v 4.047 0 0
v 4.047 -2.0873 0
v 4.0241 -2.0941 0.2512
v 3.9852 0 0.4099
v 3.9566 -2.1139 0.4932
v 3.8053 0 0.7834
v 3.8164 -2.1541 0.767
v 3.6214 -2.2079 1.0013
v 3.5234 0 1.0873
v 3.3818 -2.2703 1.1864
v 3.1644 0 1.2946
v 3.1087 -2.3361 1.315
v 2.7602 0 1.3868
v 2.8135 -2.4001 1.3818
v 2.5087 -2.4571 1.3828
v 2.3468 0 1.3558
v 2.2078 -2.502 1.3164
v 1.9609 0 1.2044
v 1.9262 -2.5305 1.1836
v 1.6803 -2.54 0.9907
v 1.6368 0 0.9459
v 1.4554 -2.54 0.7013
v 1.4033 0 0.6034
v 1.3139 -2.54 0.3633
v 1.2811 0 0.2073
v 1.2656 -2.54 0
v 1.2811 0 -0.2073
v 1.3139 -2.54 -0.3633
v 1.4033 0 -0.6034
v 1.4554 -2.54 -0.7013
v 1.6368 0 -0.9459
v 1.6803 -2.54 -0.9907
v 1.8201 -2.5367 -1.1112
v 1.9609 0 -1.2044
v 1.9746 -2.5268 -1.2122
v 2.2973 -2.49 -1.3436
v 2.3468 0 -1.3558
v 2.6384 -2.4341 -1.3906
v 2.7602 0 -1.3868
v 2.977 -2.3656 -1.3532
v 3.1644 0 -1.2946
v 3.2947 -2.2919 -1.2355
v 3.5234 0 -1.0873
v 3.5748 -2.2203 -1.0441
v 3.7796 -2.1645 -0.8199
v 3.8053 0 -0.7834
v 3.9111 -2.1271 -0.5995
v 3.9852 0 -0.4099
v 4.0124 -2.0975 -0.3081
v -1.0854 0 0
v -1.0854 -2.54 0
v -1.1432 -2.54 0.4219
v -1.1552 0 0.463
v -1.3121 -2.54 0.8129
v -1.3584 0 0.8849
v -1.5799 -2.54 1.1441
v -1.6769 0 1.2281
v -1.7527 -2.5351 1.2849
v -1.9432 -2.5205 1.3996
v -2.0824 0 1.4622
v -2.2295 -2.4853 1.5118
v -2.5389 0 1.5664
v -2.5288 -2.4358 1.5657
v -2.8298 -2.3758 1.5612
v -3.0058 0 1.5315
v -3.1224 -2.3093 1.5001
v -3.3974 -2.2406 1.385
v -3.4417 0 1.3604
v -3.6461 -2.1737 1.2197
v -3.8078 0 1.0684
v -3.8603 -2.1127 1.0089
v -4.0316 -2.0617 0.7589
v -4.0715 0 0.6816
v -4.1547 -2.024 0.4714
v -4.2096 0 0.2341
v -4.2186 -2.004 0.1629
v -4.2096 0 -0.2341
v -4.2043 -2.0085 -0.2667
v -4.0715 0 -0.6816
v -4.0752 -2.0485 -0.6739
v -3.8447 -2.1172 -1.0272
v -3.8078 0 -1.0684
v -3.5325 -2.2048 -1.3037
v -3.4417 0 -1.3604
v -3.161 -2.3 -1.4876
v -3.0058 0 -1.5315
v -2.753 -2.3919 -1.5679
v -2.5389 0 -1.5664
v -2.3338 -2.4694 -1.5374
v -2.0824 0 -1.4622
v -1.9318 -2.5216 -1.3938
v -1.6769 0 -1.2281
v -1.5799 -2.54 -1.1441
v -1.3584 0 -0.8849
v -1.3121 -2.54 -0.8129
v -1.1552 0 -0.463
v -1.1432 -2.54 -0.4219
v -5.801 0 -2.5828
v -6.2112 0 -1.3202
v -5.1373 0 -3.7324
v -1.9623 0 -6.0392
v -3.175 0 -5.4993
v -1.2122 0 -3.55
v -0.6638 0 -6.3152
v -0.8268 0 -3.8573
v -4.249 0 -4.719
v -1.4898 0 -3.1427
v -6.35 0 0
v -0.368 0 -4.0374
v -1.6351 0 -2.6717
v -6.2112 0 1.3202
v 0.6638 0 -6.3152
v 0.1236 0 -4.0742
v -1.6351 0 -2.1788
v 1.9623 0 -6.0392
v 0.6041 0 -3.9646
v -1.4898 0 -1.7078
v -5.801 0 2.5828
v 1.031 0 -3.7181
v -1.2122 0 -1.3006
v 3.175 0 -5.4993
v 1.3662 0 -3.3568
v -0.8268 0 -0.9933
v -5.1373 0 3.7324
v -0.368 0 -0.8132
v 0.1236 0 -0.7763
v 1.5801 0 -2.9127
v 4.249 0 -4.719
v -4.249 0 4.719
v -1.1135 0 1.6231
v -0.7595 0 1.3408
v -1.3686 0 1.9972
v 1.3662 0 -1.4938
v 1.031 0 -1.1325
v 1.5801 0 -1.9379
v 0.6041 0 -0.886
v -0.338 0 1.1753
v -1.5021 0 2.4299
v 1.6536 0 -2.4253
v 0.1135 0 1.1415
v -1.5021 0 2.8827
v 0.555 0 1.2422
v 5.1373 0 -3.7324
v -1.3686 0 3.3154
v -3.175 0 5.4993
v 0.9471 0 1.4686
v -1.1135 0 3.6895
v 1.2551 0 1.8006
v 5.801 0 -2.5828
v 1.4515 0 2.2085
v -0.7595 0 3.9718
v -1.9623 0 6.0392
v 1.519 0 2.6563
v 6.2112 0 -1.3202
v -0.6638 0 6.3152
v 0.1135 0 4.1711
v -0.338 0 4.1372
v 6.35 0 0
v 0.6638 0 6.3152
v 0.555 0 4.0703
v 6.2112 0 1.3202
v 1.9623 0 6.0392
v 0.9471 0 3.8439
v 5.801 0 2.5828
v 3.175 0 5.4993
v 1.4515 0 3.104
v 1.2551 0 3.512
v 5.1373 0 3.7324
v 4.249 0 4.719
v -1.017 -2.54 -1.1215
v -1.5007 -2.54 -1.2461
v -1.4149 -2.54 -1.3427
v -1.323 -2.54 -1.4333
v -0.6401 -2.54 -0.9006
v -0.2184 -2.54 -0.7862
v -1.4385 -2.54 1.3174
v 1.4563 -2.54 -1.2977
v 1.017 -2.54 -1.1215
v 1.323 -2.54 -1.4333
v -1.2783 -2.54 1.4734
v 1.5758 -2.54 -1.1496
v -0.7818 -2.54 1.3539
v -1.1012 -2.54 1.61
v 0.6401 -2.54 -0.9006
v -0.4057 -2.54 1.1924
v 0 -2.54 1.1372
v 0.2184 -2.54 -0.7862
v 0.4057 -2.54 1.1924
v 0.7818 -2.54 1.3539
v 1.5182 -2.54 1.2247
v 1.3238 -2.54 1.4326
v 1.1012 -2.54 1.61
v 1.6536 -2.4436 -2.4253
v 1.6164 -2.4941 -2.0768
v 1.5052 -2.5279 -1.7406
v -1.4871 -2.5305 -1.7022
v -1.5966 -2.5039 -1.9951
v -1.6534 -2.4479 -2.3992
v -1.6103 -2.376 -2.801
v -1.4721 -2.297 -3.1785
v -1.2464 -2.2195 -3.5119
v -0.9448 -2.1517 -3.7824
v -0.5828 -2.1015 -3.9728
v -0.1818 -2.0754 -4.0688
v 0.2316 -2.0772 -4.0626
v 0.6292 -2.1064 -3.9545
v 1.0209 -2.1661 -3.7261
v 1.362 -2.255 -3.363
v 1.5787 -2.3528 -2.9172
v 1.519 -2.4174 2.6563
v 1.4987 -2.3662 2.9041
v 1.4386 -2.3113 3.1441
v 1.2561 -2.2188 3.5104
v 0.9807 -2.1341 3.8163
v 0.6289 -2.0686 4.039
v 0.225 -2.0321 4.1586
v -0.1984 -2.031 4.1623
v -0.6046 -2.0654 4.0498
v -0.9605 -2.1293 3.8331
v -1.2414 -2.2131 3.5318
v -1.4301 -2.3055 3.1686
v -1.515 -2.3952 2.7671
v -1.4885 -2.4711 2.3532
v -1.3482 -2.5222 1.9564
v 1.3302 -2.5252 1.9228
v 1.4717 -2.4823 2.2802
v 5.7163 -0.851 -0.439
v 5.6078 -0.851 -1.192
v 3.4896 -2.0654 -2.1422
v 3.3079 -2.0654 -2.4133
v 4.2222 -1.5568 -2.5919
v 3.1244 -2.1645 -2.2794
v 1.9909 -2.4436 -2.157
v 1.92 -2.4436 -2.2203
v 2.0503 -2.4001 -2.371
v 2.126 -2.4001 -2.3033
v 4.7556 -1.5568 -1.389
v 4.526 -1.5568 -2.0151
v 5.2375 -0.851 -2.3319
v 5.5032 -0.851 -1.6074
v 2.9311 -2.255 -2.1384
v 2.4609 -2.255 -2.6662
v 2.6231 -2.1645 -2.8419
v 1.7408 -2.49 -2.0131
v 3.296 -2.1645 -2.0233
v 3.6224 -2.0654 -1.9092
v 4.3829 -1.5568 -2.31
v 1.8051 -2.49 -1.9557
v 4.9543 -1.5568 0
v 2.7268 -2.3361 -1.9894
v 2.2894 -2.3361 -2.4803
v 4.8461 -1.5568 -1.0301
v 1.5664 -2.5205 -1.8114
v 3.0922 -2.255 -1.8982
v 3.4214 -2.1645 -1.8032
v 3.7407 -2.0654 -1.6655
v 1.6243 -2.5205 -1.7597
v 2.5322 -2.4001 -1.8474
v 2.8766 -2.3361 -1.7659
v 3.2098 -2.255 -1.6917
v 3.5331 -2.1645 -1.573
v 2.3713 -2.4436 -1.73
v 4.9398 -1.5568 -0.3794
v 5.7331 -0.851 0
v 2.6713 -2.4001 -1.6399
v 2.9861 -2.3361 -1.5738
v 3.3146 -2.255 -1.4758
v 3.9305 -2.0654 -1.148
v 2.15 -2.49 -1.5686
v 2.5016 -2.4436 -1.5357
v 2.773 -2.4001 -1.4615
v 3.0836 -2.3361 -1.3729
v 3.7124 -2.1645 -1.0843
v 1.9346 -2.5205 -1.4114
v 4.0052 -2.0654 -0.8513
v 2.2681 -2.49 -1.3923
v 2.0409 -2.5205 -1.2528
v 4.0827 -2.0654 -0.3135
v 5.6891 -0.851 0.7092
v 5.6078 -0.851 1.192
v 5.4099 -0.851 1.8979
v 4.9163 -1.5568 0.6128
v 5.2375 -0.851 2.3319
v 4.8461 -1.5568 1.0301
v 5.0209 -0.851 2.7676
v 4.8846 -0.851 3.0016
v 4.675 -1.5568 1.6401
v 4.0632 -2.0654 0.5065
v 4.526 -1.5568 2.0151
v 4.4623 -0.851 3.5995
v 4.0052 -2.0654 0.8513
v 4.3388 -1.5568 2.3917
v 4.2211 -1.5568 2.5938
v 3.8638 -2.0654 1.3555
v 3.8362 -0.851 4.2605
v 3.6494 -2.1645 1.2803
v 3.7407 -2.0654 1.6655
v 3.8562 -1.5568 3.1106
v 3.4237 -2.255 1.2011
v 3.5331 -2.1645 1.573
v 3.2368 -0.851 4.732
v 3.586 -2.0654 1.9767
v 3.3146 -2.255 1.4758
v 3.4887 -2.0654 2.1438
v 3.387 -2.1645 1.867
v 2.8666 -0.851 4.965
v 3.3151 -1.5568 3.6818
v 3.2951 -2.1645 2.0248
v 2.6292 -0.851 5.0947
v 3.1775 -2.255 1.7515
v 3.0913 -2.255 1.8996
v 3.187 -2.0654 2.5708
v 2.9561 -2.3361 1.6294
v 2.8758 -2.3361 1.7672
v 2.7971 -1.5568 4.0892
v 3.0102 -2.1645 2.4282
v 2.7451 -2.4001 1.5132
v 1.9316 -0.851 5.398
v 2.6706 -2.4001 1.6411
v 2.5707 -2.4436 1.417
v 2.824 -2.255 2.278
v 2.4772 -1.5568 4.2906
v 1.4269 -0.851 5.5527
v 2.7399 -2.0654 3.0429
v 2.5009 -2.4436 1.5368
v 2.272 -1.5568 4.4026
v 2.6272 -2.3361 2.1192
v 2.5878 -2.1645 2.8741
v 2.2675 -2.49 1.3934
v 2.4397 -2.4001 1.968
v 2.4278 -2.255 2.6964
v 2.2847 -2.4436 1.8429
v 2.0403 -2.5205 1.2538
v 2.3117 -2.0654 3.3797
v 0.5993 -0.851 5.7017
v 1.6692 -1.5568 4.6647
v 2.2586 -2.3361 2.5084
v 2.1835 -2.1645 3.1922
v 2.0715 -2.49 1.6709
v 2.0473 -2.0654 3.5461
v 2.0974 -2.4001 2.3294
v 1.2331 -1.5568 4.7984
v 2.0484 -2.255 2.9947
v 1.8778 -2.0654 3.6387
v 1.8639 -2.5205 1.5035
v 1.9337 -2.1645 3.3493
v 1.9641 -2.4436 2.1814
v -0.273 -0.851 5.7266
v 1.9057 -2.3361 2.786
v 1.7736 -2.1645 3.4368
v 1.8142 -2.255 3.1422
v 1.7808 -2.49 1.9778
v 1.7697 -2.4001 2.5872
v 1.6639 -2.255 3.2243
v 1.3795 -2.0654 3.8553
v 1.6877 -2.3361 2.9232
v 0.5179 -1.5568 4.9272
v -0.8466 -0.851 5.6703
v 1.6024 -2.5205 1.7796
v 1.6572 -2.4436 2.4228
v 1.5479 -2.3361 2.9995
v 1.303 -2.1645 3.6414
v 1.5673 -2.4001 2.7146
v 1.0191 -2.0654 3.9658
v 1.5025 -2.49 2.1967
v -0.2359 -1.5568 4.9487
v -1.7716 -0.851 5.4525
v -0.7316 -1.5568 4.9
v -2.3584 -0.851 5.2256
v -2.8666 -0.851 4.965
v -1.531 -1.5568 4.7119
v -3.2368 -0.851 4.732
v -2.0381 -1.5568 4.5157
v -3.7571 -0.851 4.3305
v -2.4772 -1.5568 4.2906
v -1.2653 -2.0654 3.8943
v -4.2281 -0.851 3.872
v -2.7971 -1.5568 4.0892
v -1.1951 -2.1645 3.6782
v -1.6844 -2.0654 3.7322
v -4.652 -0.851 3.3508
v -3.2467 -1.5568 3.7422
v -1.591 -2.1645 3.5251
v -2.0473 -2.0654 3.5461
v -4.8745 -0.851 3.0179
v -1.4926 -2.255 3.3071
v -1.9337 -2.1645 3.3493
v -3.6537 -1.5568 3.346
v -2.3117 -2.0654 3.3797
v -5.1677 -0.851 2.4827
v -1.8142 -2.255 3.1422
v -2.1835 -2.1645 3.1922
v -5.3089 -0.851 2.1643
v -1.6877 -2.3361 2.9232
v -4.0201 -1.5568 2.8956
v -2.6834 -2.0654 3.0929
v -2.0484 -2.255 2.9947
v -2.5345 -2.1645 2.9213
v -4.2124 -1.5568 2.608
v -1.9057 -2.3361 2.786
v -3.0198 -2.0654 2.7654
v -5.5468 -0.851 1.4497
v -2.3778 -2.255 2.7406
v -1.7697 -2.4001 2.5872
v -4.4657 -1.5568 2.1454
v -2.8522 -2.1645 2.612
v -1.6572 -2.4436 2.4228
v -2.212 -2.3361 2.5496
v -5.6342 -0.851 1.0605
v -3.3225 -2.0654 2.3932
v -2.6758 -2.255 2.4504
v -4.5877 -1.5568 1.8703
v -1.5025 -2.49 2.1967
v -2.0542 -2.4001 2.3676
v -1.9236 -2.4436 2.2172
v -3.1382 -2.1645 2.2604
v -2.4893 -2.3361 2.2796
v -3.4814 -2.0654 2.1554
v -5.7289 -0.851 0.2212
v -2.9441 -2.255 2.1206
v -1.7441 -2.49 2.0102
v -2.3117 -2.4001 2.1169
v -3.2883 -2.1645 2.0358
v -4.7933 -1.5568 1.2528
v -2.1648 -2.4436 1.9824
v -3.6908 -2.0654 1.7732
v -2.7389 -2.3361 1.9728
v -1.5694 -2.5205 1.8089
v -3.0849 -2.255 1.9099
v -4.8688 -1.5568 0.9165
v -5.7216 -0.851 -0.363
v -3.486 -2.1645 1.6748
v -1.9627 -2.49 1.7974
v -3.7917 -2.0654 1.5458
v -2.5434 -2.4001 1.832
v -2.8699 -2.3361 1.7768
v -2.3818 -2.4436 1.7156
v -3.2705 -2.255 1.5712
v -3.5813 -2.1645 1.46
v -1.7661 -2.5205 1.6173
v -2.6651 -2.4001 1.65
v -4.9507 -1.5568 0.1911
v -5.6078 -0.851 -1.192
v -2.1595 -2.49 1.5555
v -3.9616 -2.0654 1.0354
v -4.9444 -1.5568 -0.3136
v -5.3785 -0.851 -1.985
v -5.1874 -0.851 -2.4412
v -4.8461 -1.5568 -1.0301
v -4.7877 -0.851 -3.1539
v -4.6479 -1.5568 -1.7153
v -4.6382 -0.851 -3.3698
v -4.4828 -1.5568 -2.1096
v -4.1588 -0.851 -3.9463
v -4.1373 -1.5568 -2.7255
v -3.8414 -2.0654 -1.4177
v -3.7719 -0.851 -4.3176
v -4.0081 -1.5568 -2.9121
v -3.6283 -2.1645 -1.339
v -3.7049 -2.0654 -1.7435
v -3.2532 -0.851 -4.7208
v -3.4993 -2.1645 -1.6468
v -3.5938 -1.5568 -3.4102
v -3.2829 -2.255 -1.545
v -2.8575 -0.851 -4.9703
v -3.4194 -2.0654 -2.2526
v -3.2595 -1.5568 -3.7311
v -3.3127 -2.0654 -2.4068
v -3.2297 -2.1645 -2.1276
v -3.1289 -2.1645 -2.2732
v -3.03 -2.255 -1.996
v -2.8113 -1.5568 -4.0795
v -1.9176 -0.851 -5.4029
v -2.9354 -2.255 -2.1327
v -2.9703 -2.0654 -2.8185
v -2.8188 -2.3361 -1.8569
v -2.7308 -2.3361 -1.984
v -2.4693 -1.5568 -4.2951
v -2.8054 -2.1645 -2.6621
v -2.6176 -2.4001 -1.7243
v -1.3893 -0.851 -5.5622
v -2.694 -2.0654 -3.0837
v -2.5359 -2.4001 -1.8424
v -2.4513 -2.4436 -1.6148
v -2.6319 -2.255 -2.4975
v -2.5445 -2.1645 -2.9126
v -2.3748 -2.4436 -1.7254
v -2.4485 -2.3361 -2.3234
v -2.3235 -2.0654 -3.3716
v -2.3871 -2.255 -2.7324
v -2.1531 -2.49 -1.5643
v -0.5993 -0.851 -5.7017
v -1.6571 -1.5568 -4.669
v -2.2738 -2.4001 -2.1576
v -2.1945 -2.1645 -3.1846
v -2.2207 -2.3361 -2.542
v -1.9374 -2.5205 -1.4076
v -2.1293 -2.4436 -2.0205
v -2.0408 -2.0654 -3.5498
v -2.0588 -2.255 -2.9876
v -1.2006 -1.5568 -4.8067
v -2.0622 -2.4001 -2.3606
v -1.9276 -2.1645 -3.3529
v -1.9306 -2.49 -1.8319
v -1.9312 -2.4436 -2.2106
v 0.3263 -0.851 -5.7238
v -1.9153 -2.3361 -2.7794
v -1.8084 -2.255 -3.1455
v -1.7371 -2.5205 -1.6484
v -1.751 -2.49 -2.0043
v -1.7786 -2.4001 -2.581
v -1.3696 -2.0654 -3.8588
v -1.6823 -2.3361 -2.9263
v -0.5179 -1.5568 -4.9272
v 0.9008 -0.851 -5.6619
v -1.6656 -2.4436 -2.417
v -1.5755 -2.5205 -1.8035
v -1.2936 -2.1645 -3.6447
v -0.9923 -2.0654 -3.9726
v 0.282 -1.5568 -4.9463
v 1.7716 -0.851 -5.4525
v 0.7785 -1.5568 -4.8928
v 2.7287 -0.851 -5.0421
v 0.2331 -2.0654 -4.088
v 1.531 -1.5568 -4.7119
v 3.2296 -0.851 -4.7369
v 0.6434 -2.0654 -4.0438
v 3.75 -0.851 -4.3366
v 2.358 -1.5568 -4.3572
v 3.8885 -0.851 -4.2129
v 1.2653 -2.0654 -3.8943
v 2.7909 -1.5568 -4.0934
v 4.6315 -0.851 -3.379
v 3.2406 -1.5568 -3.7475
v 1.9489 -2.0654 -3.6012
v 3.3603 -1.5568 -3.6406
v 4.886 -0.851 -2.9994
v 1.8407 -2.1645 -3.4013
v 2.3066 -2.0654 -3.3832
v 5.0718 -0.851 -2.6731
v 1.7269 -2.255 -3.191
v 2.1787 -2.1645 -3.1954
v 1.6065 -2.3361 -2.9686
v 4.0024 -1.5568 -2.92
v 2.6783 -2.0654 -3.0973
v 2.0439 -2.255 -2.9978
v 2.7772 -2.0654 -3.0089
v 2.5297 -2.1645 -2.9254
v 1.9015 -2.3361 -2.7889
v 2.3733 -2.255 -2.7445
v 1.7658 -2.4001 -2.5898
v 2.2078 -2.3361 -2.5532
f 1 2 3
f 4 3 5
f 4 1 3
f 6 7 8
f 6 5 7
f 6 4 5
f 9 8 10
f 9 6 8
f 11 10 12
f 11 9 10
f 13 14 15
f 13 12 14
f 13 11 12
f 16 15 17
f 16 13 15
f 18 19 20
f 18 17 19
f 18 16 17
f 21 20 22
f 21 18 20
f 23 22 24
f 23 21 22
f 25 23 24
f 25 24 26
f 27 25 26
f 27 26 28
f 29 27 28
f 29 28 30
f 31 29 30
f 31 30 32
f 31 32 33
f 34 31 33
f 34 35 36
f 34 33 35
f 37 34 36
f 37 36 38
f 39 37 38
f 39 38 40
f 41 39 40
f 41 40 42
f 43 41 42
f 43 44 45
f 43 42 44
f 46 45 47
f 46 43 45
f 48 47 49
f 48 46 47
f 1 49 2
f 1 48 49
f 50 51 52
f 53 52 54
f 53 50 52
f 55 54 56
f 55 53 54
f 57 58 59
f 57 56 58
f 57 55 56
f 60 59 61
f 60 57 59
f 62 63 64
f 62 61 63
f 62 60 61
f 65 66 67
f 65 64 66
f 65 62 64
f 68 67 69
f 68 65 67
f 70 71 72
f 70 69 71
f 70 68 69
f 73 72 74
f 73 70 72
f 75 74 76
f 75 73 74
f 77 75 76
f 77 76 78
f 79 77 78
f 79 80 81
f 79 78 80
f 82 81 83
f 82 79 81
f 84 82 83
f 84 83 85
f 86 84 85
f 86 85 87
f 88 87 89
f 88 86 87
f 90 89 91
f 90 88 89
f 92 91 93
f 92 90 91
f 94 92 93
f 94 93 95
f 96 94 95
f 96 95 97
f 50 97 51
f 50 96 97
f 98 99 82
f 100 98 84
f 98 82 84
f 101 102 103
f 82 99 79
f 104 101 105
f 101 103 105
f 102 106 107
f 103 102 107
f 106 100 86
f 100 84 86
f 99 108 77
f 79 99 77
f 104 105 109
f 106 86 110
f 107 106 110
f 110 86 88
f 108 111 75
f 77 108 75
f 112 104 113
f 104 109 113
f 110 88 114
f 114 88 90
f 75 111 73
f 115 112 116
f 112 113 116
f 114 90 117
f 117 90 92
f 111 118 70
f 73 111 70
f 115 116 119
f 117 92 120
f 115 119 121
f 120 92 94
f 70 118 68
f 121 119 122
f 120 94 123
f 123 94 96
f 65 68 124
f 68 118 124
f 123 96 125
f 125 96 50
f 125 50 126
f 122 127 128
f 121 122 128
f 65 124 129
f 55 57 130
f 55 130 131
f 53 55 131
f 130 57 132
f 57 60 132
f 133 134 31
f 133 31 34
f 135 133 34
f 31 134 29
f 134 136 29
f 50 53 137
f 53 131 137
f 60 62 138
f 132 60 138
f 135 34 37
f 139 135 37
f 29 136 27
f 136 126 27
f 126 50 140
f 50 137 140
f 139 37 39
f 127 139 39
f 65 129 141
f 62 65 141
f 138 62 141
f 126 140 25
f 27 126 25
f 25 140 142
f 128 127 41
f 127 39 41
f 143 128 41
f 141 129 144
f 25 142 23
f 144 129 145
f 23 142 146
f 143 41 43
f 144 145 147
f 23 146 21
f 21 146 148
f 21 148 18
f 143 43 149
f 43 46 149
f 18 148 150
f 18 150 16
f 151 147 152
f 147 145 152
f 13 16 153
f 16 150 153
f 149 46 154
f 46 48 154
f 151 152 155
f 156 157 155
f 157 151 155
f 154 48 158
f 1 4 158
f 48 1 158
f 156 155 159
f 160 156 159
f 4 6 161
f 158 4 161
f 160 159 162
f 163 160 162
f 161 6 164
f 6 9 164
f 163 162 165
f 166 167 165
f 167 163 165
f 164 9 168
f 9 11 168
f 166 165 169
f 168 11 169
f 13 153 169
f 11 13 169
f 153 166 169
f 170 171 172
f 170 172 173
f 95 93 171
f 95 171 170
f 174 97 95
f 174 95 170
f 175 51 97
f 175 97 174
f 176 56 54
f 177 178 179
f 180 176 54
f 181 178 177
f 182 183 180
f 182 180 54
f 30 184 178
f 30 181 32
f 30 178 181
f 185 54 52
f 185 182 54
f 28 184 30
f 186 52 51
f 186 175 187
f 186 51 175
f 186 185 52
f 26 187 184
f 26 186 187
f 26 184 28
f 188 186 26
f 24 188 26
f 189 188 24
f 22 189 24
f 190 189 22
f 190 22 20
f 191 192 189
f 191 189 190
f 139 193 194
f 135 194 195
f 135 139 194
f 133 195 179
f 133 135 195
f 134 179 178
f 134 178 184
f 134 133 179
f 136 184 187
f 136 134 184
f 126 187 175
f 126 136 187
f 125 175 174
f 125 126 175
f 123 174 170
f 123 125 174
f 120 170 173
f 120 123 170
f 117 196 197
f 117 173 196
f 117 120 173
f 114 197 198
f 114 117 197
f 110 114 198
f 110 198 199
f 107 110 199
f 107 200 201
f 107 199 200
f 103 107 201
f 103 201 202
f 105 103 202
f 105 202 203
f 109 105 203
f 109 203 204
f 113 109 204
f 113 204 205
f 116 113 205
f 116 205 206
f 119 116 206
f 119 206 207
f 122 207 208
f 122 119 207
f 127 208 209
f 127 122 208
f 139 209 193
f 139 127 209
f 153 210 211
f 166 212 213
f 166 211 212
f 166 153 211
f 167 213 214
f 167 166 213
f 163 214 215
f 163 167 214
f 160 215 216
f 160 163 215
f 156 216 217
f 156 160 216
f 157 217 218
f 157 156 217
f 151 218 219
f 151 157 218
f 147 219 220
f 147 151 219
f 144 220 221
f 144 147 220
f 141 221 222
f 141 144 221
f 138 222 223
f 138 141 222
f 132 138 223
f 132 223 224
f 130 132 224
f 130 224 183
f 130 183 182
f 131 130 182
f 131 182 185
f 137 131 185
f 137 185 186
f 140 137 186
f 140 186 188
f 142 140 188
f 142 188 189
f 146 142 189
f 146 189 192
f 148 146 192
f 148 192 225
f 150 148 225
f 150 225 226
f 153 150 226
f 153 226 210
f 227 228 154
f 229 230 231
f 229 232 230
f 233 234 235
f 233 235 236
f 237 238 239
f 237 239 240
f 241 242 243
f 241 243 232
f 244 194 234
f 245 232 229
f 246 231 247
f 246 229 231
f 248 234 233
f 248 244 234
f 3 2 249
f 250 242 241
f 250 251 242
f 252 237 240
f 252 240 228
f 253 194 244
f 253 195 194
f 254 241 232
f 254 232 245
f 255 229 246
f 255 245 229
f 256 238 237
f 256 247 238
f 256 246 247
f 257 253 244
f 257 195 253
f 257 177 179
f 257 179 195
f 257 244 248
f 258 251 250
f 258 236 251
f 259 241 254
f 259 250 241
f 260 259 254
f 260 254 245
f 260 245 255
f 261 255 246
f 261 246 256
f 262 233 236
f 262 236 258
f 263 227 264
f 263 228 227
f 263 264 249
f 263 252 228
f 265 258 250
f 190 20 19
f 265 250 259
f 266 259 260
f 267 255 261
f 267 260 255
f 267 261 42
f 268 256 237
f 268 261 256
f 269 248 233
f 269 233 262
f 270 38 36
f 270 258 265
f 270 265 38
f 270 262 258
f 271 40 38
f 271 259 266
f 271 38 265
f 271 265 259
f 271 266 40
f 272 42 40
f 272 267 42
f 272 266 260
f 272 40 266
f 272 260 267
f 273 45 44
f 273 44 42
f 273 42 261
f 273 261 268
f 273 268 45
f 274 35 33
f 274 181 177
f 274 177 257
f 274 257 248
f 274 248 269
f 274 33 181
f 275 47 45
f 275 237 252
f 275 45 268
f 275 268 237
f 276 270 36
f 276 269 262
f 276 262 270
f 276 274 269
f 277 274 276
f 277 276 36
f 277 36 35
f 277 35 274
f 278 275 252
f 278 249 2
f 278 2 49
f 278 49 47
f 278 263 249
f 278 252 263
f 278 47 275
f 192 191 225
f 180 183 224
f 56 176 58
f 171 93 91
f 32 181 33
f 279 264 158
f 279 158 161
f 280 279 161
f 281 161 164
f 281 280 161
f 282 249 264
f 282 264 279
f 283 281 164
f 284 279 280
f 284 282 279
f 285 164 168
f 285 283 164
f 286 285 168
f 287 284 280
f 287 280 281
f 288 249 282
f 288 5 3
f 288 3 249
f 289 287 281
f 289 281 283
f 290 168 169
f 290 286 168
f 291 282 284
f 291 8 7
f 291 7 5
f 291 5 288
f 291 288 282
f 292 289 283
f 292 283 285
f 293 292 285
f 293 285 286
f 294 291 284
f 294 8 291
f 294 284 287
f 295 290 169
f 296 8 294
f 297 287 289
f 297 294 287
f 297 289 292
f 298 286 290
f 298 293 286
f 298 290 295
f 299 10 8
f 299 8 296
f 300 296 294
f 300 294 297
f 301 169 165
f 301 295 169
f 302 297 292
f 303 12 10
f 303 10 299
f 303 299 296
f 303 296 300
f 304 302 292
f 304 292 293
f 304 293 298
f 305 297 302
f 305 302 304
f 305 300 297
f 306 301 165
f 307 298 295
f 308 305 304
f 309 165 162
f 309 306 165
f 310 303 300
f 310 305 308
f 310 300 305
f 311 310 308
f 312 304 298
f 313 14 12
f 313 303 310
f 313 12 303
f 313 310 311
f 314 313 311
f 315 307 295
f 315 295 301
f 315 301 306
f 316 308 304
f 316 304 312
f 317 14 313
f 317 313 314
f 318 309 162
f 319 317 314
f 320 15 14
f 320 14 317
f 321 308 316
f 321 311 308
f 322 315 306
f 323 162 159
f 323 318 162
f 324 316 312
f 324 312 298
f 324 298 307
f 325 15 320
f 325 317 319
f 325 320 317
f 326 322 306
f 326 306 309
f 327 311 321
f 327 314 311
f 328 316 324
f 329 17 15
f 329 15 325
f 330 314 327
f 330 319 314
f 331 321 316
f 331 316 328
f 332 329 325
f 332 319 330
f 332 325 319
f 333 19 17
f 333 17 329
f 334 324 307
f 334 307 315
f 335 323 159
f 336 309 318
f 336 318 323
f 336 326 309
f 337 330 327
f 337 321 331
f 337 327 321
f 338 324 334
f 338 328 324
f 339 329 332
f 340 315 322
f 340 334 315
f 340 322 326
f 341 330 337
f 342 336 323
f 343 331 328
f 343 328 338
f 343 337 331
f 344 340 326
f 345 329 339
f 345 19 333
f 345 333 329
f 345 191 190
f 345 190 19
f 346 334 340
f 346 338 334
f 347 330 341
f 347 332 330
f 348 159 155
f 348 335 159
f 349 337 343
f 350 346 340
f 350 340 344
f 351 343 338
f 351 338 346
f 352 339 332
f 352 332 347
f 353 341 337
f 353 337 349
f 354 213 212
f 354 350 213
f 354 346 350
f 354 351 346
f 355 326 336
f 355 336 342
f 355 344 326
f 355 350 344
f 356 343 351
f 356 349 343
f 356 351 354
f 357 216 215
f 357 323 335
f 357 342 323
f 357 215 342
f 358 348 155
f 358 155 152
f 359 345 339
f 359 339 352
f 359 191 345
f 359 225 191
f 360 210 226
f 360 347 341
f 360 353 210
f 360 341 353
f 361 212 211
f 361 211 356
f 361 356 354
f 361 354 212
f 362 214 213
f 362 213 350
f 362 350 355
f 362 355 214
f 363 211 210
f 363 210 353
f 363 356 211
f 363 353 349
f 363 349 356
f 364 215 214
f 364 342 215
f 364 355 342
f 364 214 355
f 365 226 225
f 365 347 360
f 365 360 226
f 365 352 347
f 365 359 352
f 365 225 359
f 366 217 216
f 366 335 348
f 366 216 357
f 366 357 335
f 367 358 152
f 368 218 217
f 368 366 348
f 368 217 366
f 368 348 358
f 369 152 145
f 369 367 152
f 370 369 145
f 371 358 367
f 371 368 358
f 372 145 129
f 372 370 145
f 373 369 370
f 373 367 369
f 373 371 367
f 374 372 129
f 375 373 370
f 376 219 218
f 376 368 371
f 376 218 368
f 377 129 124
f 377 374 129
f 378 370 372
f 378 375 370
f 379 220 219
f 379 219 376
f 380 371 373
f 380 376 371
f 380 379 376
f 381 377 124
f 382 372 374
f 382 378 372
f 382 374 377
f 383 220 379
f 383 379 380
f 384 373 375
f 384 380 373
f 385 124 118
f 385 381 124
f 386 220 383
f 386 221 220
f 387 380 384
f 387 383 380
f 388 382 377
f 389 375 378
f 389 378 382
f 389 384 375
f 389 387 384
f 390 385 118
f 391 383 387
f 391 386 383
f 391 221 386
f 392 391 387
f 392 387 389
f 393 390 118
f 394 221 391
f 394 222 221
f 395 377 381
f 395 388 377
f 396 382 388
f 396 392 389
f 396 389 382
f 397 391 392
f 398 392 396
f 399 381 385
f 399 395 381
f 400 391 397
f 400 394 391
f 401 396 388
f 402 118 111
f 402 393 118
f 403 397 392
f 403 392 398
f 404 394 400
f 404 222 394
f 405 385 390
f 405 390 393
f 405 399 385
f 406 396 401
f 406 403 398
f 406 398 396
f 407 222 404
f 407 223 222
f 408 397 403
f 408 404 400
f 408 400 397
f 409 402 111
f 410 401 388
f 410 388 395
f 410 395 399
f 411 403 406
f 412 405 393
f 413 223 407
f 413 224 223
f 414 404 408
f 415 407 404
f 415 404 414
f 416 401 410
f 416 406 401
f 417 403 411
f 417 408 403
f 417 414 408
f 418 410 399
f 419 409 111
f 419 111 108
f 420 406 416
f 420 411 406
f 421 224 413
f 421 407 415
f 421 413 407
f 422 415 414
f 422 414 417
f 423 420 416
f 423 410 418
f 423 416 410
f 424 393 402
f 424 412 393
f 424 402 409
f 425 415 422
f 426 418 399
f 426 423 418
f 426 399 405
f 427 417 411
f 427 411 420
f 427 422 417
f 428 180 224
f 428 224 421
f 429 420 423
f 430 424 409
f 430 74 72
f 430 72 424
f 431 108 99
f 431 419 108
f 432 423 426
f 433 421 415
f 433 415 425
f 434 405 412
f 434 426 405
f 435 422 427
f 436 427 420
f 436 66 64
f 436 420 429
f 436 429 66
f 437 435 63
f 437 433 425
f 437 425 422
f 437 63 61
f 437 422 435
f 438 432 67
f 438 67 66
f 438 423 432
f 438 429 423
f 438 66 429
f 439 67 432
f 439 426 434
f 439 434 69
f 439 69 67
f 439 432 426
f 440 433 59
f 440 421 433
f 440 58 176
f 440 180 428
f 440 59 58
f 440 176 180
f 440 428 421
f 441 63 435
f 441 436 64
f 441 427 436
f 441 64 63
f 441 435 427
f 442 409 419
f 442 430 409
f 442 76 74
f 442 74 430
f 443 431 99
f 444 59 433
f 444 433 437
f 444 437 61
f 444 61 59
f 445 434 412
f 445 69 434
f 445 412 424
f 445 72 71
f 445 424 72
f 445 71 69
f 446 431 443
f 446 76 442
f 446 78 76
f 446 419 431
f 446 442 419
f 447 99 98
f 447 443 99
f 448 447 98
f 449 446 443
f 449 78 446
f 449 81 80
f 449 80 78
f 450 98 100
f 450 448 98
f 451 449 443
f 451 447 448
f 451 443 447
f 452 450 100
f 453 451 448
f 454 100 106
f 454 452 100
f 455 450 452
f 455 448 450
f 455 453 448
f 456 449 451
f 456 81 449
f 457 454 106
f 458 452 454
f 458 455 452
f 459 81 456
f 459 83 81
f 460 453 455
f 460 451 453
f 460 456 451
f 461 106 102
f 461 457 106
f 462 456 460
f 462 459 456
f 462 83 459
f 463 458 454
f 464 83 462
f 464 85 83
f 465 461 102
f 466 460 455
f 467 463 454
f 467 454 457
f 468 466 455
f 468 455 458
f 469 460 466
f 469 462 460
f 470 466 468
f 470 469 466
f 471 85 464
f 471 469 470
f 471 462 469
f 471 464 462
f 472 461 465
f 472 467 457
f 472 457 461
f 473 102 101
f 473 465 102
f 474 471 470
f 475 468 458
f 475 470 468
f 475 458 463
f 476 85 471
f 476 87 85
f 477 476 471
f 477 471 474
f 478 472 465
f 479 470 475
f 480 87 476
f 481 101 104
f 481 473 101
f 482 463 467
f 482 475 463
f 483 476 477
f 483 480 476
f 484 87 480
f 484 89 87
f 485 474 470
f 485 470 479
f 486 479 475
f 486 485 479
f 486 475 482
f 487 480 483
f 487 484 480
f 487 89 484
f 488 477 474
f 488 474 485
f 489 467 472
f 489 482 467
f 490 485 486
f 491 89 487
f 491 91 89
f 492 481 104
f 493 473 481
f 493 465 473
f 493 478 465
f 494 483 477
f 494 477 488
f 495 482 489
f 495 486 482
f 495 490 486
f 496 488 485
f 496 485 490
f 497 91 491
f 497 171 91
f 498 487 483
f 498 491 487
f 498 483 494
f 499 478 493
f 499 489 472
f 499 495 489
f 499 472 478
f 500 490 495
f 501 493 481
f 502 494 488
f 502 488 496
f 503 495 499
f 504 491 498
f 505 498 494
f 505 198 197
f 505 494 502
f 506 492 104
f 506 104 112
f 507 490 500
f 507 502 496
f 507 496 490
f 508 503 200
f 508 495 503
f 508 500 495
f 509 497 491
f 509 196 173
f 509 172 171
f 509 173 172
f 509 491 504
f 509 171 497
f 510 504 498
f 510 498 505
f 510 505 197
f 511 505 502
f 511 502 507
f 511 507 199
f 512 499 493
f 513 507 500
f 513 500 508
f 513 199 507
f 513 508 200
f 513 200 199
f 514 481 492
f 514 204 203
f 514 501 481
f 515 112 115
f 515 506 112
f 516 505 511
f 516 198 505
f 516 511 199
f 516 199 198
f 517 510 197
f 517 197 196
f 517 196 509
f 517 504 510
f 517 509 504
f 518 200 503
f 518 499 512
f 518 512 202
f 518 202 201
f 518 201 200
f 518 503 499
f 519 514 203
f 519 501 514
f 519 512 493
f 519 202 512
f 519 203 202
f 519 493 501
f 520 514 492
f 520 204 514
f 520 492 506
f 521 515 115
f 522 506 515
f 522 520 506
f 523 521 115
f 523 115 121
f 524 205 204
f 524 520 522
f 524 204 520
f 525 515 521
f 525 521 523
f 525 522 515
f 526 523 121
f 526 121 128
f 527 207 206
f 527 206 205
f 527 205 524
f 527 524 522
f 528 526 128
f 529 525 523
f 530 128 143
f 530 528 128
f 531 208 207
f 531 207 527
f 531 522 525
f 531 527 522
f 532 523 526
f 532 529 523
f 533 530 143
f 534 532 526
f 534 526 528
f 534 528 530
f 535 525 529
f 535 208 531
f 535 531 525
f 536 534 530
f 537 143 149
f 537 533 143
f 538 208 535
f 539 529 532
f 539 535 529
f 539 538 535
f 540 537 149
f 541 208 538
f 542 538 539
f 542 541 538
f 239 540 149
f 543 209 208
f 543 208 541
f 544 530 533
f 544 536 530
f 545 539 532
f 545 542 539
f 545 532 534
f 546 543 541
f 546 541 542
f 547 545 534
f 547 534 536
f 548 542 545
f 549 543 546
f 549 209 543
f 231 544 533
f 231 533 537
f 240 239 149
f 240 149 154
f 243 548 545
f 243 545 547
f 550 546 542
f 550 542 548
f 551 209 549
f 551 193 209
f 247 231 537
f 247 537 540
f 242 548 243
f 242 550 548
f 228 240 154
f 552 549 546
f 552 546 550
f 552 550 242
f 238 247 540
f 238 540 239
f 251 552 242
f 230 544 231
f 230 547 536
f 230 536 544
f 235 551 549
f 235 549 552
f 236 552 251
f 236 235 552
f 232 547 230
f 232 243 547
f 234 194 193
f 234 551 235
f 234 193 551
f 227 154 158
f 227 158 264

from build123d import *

# Parameters (mm, degrees)
F0_R     = 6.35
F0_R_2   = 1.6535683919
F0_R_3   = 1.5708348414
F0_R_4   = 1.3906858061
F0_R_5   = 1.5190356383
F1_DEPTH = 2.54


# Not quite as in the source:
# - a fillet or chamfer that OpenCascade refuses, or shapes differently, is made with other operations: its cross-section is extruded or revolved along the edge and cut away or added


with BuildPart() as f1:
    # F0 (on Front) → F1 (new body)
    with BuildSketch(Plane.XZ):
        Circle(F0_R)
        with Locations((0, -2.4252922231)):
            Circle(F0_R_2, mode=Mode.SUBTRACT)
        with Locations((-2.6562736366, 0)):
            Circle(F0_R_3, mode=Mode.SUBTRACT)
        with Locations((2.6562768198, 0)):
            Circle(F0_R_4, mode=Mode.SUBTRACT)
        with Locations((0, 2.6562763651)):
            Circle(F0_R_5, mode=Mode.SUBTRACT)
    extrude(amount=F1_DEPTH)

    # F2: fillet of radius 5.08 on 1 edges, made by hand

    # F2_s1 → F2_t2 (revolve, cut)
    with BuildSketch(Plane.XY):
        with BuildLine():
            ThreePointArc((6.35, 0), (4.4905909488, -1.8594090512), (1.9505909488, -2.54))
            Line((1.9505909488, -2.54), (6.35, -2.54))
            Line((6.35, -2.54), (6.35, 0))
        make_face()
    revolve(axis=Axis((0, -2.54, 0), (0, -1, 0)), mode=Mode.SUBTRACT)


solid = f1.part
